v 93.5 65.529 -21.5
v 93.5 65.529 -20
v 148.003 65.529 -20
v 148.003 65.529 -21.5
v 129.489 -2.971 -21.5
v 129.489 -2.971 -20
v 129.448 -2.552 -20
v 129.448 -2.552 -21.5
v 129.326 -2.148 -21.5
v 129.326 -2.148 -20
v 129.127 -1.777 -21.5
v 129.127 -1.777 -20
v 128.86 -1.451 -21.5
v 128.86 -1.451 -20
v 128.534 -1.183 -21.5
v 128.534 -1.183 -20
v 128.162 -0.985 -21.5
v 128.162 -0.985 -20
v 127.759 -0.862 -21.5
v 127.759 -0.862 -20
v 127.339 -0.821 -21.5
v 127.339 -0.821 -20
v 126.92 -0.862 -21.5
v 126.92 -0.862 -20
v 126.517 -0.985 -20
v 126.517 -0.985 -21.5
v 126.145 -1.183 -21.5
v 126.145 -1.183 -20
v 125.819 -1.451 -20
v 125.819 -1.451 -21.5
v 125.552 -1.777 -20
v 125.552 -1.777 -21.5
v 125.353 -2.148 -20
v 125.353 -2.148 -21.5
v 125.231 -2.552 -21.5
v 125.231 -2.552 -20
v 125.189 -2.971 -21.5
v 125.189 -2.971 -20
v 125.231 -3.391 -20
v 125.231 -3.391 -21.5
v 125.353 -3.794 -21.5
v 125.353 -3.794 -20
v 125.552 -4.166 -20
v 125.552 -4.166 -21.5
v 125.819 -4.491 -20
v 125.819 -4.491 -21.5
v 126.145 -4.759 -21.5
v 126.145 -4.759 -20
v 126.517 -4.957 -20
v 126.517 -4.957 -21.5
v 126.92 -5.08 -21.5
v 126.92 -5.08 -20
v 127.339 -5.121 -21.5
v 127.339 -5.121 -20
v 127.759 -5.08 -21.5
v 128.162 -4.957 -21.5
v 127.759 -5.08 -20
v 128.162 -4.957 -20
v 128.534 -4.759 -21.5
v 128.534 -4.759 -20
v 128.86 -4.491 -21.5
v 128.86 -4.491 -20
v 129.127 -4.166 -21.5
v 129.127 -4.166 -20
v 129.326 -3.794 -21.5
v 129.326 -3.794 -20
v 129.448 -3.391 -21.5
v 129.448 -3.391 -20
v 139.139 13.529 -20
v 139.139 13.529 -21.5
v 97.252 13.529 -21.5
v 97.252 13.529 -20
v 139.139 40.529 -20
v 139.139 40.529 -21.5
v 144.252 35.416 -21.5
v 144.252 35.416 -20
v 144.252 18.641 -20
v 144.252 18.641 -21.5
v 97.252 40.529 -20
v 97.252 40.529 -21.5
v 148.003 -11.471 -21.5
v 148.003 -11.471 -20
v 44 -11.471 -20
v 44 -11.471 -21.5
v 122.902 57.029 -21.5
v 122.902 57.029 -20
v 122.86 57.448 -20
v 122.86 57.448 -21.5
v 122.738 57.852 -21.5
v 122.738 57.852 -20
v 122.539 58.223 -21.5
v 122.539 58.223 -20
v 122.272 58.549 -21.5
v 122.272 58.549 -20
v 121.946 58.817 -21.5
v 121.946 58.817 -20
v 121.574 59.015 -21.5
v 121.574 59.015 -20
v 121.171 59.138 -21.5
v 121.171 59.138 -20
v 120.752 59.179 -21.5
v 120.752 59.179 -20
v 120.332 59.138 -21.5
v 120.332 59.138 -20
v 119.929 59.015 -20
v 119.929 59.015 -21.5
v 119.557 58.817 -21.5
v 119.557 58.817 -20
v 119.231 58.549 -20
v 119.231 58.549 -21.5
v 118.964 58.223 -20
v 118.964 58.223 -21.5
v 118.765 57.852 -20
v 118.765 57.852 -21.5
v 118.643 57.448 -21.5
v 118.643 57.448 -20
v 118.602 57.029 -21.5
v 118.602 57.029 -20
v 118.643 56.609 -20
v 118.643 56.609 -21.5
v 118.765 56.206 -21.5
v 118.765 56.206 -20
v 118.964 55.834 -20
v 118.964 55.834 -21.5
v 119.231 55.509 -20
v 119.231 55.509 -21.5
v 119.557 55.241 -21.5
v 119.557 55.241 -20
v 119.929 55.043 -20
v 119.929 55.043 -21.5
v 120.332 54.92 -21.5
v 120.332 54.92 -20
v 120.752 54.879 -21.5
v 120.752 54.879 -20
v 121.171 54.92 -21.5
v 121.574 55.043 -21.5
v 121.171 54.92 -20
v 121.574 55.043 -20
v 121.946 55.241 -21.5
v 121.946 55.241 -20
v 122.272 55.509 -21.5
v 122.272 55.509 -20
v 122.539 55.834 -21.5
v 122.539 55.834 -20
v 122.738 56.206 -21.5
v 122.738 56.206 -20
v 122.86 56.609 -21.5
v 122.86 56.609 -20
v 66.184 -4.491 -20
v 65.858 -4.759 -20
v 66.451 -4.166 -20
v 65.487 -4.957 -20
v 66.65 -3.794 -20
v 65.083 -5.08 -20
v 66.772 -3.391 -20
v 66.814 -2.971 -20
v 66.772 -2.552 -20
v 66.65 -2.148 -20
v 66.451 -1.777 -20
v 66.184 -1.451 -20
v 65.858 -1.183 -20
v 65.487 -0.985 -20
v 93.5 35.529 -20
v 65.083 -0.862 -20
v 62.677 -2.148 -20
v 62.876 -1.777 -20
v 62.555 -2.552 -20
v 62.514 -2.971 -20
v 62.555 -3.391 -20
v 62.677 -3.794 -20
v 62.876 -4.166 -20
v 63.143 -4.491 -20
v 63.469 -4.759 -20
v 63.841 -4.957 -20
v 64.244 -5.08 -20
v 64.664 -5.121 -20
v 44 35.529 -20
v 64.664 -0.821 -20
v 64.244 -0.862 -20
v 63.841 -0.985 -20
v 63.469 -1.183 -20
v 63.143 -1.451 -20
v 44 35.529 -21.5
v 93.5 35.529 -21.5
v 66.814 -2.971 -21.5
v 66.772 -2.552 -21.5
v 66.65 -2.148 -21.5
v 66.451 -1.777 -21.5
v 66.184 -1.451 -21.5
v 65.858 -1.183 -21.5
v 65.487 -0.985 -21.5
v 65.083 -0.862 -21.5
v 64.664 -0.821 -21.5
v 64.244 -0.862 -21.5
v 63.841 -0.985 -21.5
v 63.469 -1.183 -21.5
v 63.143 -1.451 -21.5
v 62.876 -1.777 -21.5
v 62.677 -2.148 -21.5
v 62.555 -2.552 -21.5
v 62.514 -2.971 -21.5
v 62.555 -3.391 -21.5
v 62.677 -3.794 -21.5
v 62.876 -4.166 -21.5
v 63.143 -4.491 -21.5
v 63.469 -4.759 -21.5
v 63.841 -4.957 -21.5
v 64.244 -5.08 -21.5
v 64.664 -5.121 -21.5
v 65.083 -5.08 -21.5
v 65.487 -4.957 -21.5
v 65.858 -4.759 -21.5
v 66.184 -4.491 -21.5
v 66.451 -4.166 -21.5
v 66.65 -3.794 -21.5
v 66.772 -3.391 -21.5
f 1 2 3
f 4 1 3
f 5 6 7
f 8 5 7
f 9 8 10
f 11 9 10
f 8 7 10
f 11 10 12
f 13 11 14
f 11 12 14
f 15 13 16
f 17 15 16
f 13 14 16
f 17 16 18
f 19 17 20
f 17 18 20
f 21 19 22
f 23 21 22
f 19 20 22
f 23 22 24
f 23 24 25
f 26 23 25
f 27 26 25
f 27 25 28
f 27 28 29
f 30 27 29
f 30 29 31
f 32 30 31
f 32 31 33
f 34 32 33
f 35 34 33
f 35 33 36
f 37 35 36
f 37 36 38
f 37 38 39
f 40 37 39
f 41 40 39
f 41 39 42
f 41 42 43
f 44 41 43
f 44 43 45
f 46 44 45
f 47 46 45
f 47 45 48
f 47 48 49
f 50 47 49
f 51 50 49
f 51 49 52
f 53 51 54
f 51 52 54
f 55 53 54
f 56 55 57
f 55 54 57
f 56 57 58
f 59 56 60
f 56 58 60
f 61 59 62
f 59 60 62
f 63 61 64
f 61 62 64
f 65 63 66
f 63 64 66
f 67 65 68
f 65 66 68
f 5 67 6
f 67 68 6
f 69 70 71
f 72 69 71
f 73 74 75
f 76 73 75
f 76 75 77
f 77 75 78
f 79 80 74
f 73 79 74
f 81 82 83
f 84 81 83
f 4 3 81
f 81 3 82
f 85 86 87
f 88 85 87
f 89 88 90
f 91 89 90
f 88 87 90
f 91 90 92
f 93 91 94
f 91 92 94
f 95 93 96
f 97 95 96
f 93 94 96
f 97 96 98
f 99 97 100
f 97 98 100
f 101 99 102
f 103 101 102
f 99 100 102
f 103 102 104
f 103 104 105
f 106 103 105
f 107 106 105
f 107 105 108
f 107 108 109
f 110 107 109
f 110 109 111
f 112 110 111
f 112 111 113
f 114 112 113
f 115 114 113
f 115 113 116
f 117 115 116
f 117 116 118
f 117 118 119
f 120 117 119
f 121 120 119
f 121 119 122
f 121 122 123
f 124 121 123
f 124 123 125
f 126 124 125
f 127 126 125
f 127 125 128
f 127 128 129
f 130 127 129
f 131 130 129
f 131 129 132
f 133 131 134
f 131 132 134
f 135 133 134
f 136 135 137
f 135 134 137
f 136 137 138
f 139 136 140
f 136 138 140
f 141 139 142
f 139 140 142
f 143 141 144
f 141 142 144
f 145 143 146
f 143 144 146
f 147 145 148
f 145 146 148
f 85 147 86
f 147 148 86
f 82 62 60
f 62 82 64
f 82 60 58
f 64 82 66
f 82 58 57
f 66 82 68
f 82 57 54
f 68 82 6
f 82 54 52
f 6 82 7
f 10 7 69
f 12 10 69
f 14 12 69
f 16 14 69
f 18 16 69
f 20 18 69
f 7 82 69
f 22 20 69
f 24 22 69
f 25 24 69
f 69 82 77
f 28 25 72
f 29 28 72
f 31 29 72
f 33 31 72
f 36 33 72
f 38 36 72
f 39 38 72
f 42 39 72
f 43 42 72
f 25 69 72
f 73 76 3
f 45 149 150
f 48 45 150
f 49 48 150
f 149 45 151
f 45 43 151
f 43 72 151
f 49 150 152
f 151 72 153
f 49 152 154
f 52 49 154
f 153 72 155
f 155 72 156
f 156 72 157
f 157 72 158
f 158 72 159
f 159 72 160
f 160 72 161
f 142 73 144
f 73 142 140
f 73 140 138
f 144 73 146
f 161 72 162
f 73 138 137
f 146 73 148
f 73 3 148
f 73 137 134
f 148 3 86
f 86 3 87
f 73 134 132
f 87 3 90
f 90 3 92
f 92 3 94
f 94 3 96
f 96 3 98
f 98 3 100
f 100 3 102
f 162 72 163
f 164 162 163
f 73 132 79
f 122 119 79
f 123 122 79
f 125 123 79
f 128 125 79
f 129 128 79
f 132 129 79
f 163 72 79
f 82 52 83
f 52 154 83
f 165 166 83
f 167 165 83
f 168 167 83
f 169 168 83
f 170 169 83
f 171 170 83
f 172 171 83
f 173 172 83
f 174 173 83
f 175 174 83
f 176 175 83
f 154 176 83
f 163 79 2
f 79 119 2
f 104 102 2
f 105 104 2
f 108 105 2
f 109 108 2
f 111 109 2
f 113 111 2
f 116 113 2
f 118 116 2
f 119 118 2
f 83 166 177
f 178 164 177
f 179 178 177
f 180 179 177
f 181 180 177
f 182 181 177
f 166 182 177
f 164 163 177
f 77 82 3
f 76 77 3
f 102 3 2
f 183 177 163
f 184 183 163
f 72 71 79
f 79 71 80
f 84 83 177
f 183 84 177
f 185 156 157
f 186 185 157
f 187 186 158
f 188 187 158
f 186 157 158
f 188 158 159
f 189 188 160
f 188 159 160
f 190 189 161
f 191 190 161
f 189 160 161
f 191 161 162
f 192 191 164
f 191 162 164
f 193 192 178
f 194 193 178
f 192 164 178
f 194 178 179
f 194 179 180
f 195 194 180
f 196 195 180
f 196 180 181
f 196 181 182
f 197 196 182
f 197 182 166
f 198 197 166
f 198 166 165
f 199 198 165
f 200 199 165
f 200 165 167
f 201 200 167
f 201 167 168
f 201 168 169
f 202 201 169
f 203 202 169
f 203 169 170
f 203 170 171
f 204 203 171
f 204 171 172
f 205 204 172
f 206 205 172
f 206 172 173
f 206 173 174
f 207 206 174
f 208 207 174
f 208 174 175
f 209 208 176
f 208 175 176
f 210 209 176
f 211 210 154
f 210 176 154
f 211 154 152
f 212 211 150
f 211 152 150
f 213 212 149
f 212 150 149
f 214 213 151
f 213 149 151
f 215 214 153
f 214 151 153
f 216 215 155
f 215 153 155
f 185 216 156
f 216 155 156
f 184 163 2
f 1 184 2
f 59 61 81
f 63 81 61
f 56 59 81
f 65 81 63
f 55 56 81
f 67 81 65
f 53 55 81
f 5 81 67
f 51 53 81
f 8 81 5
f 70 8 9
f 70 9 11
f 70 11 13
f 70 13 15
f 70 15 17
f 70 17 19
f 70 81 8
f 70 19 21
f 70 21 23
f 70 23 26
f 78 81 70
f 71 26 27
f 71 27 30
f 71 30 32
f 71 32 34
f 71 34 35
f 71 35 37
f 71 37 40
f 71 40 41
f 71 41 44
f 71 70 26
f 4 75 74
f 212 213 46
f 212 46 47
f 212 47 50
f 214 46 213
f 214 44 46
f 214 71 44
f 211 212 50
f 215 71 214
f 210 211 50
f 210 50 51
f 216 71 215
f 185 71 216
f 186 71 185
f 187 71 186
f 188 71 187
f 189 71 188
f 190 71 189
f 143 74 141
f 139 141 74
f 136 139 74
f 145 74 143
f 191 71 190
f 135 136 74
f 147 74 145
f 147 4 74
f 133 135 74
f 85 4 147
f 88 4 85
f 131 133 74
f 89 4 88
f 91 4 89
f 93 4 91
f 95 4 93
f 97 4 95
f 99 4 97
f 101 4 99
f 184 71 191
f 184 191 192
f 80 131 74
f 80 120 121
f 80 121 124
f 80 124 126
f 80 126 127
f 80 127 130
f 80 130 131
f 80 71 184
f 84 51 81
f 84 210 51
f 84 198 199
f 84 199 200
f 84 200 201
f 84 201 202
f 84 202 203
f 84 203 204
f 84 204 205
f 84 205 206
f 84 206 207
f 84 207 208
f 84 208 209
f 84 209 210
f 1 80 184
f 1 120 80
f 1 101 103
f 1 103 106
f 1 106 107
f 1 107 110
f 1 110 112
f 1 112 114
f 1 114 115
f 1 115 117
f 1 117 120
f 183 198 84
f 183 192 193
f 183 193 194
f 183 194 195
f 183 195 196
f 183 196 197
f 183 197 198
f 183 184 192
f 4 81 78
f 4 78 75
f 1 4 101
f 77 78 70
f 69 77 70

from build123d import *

# Parameters (mm, degrees)
BOSS_EXTRU_1_DEPTH      = 1.5
D_GAGEMENT_M41_D        = 4.3
D_GAGEMENT_M41_DEPTH    = 24
ENL_V_MAT_EXTRU_1_DEPTH = 2.5


with BuildPart() as part:
    # Esquisse1 → Boss.-Extru.1 (new body)
    with BuildSketch(Plane.XY.offset(-20)):
        Polygon((148.003126518, 65.528940229), (148.003126518, -11.471059771), (44, -11.471059771), (44, 35.528940229), (93.499999998, 35.528940229), (93.499999998, 65.528940229), align=None)
    extrude(amount=-BOSS_EXTRU_1_DEPTH)

    # Dégagement M41
    with Locations(Plane(origin=(0, 0, -21.5), x_dir=(-1, 0, 0), z_dir=(0, 0, -1))):
        with Locations((-120.751563258, 57.028940229), (-127.339384783, -2.971059771), (-64.663741735, -2.971059771)):
            Hole(D_GAGEMENT_M41_D / 2, depth=D_GAGEMENT_M41_DEPTH)

    # Esquisse5 → Enlèv. mat.-Extru.1 (cut, through all)
    with BuildSketch(Plane(origin=(0, 0, -21.5), x_dir=(-1, 0, 0), z_dir=(0, 0, -1))):
        Polygon((-97.251563258, 40.528940229), (-139.139101481, 40.528940229), (-144.251563258, 35.416478452), (-144.251563258, 18.641402007), (-139.139101481, 13.528940229), (-97.251563258, 13.528940229), align=None)
    extrude(amount=-ENL_V_MAT_EXTRU_1_DEPTH, mode=Mode.SUBTRACT)


solid = part.part
